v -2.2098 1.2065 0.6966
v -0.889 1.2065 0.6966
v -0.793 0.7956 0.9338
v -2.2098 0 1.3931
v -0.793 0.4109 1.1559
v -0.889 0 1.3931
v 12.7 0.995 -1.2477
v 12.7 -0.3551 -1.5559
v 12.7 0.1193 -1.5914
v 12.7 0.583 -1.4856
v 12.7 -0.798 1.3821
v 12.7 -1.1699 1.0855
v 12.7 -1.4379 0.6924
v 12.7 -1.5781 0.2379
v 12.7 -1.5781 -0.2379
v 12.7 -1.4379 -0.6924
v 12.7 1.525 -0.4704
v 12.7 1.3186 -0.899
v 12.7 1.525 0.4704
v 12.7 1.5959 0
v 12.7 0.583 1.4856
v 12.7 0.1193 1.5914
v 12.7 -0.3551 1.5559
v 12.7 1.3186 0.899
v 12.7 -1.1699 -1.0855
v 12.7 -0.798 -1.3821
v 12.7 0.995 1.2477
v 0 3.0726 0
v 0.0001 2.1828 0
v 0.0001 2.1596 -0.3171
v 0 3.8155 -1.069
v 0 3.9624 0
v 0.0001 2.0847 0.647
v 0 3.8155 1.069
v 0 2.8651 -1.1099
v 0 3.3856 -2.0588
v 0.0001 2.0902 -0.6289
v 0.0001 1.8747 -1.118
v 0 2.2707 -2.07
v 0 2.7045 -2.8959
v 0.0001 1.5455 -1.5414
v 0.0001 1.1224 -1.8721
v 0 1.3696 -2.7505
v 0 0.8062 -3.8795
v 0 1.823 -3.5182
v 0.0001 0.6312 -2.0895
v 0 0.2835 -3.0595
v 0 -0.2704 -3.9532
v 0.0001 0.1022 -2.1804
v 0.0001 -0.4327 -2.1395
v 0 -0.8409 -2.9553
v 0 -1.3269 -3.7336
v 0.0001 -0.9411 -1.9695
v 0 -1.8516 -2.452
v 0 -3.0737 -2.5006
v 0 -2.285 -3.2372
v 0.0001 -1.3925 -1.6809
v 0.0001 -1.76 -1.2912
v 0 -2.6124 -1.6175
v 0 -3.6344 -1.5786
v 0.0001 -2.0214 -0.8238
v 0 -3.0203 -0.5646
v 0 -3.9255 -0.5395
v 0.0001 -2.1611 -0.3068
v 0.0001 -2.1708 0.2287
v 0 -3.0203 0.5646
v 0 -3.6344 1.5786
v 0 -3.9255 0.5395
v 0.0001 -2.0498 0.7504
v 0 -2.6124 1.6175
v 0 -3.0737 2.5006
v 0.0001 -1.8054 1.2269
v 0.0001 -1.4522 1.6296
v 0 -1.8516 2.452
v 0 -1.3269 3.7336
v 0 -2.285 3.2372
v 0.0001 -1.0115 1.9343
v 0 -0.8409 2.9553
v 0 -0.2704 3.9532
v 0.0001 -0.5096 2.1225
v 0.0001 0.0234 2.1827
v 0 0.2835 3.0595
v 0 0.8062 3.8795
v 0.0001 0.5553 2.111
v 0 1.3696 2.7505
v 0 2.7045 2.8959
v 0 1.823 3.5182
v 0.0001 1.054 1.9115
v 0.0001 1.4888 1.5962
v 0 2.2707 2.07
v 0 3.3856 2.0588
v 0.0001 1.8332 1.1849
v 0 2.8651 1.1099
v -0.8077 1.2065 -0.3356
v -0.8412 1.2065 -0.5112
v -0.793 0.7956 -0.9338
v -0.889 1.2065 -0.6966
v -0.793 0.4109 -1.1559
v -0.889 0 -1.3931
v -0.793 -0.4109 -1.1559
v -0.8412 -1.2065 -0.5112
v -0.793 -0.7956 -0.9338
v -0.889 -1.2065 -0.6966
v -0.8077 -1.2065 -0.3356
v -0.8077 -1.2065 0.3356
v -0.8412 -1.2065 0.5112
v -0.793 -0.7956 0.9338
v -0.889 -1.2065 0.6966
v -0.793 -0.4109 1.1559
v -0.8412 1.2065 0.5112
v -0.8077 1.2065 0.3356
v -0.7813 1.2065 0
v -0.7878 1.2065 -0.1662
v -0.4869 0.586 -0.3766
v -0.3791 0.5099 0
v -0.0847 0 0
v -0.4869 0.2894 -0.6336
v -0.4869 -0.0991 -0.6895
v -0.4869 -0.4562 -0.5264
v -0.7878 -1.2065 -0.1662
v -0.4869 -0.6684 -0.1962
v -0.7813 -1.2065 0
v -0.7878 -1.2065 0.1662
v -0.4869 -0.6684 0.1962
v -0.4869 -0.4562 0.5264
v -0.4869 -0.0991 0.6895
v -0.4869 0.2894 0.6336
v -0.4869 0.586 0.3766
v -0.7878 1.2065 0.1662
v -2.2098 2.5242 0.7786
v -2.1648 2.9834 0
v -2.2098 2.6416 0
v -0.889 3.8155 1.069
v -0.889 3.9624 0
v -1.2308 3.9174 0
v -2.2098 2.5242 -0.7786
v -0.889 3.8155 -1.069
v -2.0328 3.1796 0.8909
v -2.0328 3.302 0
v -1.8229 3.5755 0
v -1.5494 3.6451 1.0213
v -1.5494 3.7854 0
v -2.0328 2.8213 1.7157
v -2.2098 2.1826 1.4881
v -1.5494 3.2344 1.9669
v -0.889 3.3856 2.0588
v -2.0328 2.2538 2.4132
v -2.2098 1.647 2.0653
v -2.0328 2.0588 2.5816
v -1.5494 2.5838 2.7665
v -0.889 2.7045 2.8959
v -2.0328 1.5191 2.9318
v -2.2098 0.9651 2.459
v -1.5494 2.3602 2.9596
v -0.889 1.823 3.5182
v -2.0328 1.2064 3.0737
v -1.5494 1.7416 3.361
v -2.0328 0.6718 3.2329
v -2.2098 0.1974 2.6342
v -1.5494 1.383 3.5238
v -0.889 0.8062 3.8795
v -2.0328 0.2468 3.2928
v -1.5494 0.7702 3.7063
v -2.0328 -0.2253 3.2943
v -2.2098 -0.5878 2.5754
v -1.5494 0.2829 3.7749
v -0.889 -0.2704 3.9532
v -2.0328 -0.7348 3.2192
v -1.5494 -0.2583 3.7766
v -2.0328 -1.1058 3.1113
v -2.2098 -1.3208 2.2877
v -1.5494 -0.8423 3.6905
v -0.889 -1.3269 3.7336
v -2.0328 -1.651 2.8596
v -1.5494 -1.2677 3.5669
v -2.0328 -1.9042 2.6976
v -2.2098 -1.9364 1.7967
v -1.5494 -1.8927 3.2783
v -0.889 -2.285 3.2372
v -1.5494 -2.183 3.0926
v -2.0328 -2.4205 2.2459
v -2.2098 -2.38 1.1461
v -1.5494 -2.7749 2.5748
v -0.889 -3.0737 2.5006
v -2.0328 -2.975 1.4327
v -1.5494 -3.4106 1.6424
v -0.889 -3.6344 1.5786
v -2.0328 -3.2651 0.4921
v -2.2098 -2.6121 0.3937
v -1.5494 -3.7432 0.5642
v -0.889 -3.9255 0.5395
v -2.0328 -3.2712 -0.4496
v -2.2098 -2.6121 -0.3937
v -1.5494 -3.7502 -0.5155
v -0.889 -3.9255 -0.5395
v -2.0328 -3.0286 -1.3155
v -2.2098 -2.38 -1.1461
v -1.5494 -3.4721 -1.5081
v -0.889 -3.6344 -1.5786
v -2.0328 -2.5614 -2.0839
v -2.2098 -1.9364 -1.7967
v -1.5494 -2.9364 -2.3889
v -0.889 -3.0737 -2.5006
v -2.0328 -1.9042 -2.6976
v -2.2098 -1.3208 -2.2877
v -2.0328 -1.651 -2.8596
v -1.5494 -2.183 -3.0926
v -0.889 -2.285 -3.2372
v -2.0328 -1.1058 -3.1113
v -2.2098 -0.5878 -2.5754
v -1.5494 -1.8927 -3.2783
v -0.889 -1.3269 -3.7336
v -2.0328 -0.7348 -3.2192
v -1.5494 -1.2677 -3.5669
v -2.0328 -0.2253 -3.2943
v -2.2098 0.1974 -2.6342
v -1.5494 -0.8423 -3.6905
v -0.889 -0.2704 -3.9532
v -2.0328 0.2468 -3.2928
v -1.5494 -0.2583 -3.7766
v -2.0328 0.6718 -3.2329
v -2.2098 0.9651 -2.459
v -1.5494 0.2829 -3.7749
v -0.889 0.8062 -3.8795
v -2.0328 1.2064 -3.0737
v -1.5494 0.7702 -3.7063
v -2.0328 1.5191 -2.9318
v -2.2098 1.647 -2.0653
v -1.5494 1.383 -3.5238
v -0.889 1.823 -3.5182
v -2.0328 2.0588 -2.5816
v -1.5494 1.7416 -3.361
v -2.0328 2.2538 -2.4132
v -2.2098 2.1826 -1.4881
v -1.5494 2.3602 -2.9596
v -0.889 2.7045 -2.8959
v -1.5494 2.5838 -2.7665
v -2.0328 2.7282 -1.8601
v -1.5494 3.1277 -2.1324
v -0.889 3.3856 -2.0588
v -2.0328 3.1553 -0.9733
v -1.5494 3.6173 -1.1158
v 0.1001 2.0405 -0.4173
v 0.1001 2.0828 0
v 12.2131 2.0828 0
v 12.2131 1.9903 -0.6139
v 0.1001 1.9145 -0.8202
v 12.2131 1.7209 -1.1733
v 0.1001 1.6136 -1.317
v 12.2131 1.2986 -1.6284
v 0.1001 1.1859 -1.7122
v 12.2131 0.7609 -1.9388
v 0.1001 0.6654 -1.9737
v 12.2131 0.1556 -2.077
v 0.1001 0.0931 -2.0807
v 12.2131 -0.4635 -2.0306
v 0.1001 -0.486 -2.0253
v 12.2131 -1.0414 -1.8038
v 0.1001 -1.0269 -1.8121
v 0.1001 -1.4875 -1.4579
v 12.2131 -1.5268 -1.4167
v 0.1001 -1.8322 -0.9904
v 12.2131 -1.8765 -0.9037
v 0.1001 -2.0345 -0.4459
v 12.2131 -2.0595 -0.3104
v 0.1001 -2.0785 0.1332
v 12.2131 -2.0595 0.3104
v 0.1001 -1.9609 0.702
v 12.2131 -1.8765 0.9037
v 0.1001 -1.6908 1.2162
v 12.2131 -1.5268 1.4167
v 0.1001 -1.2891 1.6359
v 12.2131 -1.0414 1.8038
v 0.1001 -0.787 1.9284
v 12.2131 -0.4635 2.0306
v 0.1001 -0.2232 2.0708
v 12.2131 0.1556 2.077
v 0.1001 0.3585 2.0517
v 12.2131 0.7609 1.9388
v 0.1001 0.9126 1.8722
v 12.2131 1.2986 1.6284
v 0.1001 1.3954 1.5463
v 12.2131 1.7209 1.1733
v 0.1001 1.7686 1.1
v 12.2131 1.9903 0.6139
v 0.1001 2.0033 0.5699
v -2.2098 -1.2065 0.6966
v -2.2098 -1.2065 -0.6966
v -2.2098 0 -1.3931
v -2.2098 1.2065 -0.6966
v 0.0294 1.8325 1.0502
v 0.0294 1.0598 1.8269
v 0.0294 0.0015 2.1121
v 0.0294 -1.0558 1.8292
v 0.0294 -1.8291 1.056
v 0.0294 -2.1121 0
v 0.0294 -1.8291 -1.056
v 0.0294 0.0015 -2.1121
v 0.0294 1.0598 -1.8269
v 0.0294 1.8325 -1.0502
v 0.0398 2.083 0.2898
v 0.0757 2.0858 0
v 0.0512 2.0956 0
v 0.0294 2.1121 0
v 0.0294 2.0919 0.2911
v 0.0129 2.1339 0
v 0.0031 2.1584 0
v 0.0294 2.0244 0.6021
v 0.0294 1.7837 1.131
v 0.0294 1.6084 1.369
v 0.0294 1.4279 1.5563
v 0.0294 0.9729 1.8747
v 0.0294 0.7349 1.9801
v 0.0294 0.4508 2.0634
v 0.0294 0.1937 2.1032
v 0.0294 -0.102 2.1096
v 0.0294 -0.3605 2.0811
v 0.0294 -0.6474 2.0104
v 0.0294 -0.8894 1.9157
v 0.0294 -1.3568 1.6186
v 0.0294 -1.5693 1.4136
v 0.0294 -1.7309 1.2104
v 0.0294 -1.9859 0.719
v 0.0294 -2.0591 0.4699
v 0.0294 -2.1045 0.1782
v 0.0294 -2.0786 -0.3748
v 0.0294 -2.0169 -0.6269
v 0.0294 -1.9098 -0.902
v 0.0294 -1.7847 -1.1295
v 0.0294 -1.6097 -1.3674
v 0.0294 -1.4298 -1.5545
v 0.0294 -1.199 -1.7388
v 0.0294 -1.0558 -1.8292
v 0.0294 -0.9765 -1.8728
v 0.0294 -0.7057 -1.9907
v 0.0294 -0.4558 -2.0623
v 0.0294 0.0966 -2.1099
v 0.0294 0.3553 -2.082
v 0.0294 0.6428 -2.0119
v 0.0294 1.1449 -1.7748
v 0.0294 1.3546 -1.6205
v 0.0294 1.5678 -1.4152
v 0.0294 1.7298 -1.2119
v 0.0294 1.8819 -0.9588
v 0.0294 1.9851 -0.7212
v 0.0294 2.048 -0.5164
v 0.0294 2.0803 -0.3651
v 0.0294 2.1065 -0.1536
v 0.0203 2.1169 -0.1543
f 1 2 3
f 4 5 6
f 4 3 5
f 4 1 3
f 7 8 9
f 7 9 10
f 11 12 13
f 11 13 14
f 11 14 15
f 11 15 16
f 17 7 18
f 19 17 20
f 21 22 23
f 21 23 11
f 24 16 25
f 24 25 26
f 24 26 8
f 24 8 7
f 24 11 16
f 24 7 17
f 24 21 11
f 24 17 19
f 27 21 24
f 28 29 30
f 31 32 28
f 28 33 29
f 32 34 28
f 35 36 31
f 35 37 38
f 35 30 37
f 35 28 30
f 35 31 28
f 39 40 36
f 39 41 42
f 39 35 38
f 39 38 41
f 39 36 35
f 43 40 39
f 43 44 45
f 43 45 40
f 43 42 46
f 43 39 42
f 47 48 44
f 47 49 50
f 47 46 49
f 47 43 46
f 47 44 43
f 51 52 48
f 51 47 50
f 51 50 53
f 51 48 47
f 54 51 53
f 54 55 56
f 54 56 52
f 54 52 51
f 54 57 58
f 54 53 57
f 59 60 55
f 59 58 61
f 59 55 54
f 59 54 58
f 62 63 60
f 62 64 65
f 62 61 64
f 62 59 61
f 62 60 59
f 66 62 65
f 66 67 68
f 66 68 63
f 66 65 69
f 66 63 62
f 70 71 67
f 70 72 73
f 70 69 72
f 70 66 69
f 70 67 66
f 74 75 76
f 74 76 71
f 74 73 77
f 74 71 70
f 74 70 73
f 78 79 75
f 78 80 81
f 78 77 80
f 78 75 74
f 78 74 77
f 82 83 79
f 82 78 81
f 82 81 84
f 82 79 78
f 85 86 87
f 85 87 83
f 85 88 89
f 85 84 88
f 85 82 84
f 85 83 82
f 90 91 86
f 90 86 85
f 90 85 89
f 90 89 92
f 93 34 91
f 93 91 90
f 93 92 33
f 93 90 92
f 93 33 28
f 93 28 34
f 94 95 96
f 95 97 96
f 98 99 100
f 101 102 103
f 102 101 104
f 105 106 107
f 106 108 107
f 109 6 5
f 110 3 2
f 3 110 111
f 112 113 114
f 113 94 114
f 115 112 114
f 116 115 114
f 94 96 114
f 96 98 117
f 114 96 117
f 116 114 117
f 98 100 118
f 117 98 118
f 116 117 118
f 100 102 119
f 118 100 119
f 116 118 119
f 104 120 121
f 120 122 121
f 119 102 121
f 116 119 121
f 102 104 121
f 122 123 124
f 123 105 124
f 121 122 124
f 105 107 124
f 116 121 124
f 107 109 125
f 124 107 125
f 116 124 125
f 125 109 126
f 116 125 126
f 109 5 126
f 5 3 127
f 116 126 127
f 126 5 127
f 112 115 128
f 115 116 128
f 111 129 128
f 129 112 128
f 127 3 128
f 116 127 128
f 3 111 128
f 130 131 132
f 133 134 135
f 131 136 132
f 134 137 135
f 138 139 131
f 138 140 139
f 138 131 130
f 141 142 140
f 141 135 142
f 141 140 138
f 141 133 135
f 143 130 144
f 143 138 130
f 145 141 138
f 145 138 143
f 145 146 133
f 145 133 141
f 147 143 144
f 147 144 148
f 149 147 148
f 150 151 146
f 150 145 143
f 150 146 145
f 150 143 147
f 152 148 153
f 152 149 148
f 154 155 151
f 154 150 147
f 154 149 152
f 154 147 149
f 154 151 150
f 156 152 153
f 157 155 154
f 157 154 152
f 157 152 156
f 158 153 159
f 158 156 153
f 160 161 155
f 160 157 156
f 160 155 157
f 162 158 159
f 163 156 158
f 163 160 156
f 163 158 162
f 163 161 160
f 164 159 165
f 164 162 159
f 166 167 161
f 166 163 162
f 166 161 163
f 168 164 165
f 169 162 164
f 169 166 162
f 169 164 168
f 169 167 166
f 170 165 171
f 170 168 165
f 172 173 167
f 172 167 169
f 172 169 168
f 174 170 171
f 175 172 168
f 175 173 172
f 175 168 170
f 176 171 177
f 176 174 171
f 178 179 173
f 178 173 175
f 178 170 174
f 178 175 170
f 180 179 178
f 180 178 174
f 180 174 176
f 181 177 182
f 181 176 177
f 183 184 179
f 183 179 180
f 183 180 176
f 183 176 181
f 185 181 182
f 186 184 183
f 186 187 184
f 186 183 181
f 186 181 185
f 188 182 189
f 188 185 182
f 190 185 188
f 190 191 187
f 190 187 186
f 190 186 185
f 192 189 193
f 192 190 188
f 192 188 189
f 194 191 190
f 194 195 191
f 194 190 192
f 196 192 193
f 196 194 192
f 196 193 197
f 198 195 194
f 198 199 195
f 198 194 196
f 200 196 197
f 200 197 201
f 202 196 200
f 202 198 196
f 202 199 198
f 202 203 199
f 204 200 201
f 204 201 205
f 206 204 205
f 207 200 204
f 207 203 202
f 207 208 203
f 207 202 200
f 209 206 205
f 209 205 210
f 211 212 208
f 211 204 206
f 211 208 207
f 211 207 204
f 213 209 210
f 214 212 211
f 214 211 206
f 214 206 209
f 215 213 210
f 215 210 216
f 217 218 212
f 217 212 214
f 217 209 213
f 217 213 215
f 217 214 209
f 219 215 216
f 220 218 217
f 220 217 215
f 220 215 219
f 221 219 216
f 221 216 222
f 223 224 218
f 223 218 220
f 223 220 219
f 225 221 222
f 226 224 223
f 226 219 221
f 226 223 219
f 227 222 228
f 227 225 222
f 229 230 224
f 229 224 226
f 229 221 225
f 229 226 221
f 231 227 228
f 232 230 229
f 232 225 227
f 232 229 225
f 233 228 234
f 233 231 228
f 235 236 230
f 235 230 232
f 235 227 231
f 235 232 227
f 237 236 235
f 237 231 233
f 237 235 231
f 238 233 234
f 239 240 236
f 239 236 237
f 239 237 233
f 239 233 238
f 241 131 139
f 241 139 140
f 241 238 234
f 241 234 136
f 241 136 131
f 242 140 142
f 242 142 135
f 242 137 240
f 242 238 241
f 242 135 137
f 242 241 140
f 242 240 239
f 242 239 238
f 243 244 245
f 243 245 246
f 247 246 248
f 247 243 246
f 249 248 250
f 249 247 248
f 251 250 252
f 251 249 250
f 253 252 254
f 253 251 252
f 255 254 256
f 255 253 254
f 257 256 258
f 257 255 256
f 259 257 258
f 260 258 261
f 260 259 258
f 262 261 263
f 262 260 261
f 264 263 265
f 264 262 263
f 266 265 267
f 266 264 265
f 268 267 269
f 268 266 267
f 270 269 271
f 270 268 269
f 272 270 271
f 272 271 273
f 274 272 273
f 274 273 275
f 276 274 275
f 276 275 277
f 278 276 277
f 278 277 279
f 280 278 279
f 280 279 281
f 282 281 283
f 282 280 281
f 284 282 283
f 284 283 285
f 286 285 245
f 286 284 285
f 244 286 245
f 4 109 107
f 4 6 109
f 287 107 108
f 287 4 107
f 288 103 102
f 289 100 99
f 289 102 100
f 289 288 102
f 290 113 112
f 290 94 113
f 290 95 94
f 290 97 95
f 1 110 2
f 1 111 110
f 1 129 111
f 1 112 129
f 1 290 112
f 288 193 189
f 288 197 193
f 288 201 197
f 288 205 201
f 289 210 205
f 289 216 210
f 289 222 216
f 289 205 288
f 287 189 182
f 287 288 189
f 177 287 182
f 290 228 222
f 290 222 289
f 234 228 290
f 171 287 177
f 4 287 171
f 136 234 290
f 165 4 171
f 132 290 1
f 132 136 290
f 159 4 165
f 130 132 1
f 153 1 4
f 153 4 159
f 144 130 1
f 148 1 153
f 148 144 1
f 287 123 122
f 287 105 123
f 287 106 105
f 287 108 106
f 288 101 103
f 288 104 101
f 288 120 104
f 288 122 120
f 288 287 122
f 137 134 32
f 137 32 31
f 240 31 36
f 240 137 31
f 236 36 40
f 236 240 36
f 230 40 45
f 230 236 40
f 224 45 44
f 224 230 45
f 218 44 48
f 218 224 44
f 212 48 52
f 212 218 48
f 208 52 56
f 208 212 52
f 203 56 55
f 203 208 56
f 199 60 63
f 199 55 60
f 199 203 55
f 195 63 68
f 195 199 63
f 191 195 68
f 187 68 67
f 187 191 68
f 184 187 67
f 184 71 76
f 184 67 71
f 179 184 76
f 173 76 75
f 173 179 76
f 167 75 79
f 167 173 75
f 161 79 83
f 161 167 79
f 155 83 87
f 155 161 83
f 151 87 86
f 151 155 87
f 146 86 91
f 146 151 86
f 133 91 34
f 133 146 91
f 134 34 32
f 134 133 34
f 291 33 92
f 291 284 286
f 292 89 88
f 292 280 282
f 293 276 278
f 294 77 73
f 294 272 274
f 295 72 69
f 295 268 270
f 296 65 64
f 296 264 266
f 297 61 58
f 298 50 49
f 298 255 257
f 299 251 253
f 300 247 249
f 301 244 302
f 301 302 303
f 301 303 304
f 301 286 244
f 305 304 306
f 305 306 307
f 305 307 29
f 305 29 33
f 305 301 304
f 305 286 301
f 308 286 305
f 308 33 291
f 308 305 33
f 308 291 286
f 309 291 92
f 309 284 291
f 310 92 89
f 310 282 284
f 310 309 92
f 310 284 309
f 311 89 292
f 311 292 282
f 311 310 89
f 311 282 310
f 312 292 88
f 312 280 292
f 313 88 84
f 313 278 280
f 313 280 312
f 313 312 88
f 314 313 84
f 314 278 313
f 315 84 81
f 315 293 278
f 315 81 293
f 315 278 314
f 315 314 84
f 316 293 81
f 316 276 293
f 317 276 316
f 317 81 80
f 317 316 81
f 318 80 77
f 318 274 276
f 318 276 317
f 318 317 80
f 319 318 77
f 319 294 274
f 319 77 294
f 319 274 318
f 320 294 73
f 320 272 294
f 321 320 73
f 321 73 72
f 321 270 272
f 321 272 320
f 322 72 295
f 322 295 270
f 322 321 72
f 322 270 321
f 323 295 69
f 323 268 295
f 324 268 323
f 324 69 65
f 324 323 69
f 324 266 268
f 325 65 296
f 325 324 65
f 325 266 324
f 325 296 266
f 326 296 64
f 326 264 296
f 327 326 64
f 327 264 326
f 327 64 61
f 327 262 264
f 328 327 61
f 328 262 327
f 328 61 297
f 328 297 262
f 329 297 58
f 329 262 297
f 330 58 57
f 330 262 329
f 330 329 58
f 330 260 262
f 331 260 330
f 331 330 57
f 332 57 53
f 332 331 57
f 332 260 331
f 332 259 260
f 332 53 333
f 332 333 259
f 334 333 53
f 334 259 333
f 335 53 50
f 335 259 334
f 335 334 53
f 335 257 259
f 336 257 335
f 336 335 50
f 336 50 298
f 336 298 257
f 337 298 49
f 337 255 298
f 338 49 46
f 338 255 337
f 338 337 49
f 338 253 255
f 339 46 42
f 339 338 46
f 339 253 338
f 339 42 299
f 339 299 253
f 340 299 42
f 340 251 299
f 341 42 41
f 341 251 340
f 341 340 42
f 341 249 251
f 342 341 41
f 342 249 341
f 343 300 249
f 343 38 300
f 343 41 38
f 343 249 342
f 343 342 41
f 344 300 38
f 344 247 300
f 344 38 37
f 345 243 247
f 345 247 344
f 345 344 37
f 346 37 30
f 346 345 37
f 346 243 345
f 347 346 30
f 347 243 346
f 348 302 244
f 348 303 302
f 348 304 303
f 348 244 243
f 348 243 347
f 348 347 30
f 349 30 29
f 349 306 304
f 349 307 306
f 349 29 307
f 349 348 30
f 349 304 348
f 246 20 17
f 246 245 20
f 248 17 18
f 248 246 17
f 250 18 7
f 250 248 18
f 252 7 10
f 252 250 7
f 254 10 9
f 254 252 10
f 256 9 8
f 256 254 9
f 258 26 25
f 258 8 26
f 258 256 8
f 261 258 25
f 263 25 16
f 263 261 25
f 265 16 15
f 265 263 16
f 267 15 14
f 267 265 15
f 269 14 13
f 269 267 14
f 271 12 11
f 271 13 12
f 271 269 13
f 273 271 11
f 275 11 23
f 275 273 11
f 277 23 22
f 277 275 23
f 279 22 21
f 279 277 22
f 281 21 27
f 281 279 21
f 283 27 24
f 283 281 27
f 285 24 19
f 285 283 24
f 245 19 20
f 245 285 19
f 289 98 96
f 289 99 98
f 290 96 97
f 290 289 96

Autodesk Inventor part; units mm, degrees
ref_plane "YZ Plane" through (0, 0, 0) normal (1, 0, 0) x (0, 1, 0)
ref_plane "XZ Plane" through (0, 0, 0) normal (0, 1, 0) x (-1, 0, 0)
sketch "Sketch1" plane through (0, 0, 0) normal (0, 0, 1) x (1, 0, 0)
  line L0 (-0.0847, 0) -> (12.7, 0)
  line L1 (12.7, 0) -> (12.7, 2.0828)
  line L2 (12.7, 2.0828) -> (1.5242, 2.0828)
  line L3 (1.5242, 2.0828) -> (0.0001, 2.0828)
  line L4 (0.0001, 2.0828) -> (0, 2.0828)
  line L5 (0, 2.0828) -> (0, 3.9624)
  line L6 (0, 3.9624) -> (-2.2098, 3.9624)
  line L7 (-2.2098, 3.9624) -> (-2.2098, 1.3931)
  line L8 (-2.2098, 1.3931) -> (-0.889, 1.3931)
  line L9 (-0.889, 1.3931) -> (-0.0847, 0)
  line L10 (-5.1918, 0) -> (15.682, 0) projected
  line L11 (0, -0.7925) -> (0, 4.7549) projected
  line L12 (1.5242, 2.0828) -> (0, 2.0828) construction
  dimension "d1" = 11.1758
  dimension "d2" = 1.5241
  dimension "d3" = 2.2098
  dimension "d4" = 1.3208
  dimension "d5" = 60
  dimension "d6" = 4.1656
  dimension "d7" = 4.1656
  dimension "d8" = 2.7863
  dimension "d9" = 7.9248
  dimension "d26" = 12.7
revolve "Body" add sketch "Sketch1" angle 360 about axis through (-0.0847, 0, 0) along (1, 0, 0)
sketch "Sketch2" plane through (-2.2098, 0, 0) normal (-1, 0, 0) x (0, 0, 1)
  circle A0 centre (0, 0) radius 1.3931 projected
  line L0 (0, -5.5474) -> (0, 5.5474) projected
  line L1 (-5.5474, 0) -> (5.5474, 0) projected
  line L2 (1.3931, 0) -> (0.6966, -1.2065)
  line L3 (0.6966, -1.2065) -> (-0.6966, -1.2065)
  line L4 (-0.6966, -1.2065) -> (-1.3931, 0)
  line L5 (-1.3931, 0) -> (-0.6966, 1.2065)
  line L6 (-0.6966, 1.2065) -> (0.6966, 1.2065)
  line L7 (0.6966, 1.2065) -> (1.3931, 0)
extrude "Slot" add sketch "Sketch2" against normal up to next contours L7 A0 | A0 L2 | L6 L0 A0 | A0 L0 L3 | L0 L6 A0 | A0 L3 L0 | L4 A0 | A0 L5
fillet "Fillet1" radius 1.3208 1 edges at (-2.2098, -3.9624, 0)
thread "Thread" size "8-32 UNC" class "2A" standard "ANSI Unified Screw Threads" length 11.1758
chamfer "Chamfer1" distance 0.4869 distance2 0.4869 1 edges at (12.7, -2.0828, 0) measured on face at (12.7, -0.1898, 0.4203)
ref_plane "Work Plane1" through (29, 0, 0) normal (0, -1, 0) x (1, 0, 0)
fillet "Fillet2" radius 0.1 1 edges at (0.0001, -2.0828, 0)
equation "\"d30\" = R"
equation "\"d17\" = RR"
equation "\"d13\" = GEL"
equation "\"d15\" = -0.5 * SPD + 0.5 * GD"
equation "\"d16\" = GUL"
equation "\"d1\" = GEL"
equation "\"d3\" = KOH"
equation "\"d4\" = INTI"
equation "\"d6\" = GD"
equation "\"d7\" = BDM"
equation "\"d8\" = 1.1547 * SW"
equation "\"d9\" = KOD"
equation "\"d26\" = NLG"
equation "\"GD\" = NND"
equation "\"NLG\" = 12.7"
equation "\"GEL\" = 11.1758"
equation "\"KOD\" = 7.9248"
equation "\"KOH\" = 2.2098"
equation "\"INTI\" = 1.3208"
equation "\"GAL\" = 1.524"
equation "\"GUL\" = 0.48692"
equation "\"BDM\" = NND"
equation "\"SW\" = 2.413"
equation "\"RR\" = 1.3208"
equation "\"SPD\" = GD1"
equation "\"R\" = 0.1"
equation "\"KR\" = 4.699"
equation "\"GD1\" = 3.19177"
equation "\"THREADDIA\" = 4.1656"
equation "\"FAWI\" = 45deg"
equation "\"KOH1\" = 1.3208"
equation "\"NND\" = 4.1656"
equation "\"TOA\" = 30deg"
equation "\"E0\" = 1.155 * SW"
properties part number "Unbrako - 8 x 1/2" material "Steel, Mild"
